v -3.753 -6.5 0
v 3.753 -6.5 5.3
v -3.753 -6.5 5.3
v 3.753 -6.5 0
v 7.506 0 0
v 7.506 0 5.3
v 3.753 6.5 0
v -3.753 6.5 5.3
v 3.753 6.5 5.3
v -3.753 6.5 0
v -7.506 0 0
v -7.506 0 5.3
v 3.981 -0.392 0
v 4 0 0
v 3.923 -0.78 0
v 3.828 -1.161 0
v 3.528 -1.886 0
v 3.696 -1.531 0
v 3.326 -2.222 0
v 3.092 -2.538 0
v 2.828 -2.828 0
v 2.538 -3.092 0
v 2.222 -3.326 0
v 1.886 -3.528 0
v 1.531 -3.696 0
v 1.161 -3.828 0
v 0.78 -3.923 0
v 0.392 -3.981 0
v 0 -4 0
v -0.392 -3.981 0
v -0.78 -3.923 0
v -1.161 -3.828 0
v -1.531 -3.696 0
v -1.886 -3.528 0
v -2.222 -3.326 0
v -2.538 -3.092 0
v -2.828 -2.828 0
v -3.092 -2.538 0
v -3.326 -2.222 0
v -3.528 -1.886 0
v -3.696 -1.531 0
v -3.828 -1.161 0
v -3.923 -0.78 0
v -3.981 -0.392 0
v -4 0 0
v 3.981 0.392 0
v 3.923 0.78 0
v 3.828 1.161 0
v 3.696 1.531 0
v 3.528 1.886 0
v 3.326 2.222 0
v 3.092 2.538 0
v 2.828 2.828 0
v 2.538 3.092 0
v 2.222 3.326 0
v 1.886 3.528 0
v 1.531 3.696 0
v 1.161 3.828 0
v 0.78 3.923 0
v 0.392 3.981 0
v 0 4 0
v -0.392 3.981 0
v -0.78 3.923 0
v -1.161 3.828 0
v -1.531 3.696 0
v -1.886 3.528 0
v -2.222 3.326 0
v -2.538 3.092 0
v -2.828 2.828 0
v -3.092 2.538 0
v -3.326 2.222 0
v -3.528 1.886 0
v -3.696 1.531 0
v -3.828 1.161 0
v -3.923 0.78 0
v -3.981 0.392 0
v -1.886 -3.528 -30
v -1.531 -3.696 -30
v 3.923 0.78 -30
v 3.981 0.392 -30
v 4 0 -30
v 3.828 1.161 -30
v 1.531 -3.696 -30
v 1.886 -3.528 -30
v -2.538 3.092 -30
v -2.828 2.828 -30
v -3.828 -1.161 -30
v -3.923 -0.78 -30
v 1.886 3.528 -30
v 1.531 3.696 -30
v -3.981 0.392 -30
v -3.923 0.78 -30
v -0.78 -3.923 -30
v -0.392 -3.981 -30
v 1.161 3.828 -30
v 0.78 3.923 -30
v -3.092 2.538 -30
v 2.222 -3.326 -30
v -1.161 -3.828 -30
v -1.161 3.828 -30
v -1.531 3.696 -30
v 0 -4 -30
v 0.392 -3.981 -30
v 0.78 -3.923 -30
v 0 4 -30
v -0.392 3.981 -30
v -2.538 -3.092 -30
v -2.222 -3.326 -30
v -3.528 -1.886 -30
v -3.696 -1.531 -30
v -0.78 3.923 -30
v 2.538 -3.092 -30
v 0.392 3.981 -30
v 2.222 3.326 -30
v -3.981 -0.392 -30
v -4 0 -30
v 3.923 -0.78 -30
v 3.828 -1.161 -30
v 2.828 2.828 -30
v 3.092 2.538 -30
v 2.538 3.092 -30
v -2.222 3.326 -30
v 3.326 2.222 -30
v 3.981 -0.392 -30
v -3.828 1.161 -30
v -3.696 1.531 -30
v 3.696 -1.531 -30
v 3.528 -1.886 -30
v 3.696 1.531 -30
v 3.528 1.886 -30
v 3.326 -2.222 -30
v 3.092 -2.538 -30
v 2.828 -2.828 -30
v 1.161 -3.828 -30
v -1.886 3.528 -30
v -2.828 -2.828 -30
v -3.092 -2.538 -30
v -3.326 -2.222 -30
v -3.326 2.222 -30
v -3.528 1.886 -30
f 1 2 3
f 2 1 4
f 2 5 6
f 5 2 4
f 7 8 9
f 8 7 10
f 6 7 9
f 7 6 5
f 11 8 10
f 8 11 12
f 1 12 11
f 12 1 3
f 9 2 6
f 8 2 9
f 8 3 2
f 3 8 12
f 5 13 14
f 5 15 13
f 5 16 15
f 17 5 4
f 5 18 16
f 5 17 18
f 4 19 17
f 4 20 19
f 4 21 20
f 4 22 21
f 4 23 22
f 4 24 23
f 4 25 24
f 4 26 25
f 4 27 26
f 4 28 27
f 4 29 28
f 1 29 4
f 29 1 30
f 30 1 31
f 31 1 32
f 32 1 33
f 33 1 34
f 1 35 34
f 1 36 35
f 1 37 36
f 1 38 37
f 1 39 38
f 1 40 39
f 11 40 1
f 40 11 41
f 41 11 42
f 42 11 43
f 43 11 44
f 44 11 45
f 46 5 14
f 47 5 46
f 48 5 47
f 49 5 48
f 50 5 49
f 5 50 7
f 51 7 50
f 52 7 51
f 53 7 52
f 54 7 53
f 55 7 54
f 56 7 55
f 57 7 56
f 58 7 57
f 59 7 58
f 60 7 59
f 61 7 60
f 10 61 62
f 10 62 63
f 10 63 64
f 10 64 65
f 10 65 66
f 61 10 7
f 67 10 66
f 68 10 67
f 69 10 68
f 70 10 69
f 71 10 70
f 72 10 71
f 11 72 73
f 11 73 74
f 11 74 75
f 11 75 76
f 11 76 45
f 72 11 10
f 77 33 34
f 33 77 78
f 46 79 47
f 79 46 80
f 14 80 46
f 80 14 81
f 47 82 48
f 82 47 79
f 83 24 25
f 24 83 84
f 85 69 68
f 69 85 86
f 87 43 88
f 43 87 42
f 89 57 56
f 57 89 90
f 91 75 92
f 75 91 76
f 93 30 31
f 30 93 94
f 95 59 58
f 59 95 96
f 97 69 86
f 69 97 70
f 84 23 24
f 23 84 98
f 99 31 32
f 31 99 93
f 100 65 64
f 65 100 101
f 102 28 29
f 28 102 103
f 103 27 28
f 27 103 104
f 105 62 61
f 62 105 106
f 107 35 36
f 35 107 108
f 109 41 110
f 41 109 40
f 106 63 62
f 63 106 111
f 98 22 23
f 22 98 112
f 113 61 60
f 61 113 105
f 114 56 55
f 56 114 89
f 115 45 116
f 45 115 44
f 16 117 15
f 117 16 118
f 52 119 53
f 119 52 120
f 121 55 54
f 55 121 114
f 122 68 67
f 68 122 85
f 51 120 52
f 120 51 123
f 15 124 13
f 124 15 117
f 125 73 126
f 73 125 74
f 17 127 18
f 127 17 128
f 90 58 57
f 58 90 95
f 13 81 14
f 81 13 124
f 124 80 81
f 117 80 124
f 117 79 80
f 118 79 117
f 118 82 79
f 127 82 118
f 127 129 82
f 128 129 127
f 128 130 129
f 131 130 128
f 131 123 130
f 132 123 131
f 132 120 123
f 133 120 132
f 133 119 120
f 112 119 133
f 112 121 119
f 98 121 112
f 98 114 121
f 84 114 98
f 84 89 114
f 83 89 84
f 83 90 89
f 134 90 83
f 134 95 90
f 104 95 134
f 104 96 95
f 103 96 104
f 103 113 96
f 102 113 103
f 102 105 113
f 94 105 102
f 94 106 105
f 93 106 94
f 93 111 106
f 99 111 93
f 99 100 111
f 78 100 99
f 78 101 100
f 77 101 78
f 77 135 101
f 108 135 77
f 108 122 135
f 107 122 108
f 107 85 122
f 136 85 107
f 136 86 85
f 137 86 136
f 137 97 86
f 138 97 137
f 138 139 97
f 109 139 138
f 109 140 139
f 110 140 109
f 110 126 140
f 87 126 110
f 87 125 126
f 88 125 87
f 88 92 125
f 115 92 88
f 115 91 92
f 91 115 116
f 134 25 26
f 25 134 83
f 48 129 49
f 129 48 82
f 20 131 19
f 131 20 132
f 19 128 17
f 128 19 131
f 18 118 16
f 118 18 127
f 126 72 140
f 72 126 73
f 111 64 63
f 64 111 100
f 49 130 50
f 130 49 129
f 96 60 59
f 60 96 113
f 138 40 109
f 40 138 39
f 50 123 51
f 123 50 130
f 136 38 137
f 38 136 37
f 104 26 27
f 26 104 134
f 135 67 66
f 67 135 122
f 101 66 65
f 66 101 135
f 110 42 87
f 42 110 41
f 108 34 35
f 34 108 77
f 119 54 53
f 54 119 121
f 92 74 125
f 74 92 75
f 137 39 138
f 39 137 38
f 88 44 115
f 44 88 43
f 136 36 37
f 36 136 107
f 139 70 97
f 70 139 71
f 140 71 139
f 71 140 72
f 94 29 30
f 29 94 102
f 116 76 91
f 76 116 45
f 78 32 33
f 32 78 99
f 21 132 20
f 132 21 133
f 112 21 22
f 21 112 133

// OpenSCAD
$fn = 64;

af = 13;          // across flats
head_h = 5.3;
shank_d = 8;
shank_l = 30;

// Hex head dimensions
head_r = af / sqrt(3);   // circumradius for given across-flats

module hex_bolt_m8() {
    union() {
        // Head: bottom face at z=0, extends in +Z
        cylinder(h = head_h, r = head_r, $fn = 6);

        // Shank: attached to head bottom, extends in -Z
        translate([0, 0, -shank_l])
            cylinder(h = shank_l, d = shank_d);
    }
}

hex_bolt_m8();
